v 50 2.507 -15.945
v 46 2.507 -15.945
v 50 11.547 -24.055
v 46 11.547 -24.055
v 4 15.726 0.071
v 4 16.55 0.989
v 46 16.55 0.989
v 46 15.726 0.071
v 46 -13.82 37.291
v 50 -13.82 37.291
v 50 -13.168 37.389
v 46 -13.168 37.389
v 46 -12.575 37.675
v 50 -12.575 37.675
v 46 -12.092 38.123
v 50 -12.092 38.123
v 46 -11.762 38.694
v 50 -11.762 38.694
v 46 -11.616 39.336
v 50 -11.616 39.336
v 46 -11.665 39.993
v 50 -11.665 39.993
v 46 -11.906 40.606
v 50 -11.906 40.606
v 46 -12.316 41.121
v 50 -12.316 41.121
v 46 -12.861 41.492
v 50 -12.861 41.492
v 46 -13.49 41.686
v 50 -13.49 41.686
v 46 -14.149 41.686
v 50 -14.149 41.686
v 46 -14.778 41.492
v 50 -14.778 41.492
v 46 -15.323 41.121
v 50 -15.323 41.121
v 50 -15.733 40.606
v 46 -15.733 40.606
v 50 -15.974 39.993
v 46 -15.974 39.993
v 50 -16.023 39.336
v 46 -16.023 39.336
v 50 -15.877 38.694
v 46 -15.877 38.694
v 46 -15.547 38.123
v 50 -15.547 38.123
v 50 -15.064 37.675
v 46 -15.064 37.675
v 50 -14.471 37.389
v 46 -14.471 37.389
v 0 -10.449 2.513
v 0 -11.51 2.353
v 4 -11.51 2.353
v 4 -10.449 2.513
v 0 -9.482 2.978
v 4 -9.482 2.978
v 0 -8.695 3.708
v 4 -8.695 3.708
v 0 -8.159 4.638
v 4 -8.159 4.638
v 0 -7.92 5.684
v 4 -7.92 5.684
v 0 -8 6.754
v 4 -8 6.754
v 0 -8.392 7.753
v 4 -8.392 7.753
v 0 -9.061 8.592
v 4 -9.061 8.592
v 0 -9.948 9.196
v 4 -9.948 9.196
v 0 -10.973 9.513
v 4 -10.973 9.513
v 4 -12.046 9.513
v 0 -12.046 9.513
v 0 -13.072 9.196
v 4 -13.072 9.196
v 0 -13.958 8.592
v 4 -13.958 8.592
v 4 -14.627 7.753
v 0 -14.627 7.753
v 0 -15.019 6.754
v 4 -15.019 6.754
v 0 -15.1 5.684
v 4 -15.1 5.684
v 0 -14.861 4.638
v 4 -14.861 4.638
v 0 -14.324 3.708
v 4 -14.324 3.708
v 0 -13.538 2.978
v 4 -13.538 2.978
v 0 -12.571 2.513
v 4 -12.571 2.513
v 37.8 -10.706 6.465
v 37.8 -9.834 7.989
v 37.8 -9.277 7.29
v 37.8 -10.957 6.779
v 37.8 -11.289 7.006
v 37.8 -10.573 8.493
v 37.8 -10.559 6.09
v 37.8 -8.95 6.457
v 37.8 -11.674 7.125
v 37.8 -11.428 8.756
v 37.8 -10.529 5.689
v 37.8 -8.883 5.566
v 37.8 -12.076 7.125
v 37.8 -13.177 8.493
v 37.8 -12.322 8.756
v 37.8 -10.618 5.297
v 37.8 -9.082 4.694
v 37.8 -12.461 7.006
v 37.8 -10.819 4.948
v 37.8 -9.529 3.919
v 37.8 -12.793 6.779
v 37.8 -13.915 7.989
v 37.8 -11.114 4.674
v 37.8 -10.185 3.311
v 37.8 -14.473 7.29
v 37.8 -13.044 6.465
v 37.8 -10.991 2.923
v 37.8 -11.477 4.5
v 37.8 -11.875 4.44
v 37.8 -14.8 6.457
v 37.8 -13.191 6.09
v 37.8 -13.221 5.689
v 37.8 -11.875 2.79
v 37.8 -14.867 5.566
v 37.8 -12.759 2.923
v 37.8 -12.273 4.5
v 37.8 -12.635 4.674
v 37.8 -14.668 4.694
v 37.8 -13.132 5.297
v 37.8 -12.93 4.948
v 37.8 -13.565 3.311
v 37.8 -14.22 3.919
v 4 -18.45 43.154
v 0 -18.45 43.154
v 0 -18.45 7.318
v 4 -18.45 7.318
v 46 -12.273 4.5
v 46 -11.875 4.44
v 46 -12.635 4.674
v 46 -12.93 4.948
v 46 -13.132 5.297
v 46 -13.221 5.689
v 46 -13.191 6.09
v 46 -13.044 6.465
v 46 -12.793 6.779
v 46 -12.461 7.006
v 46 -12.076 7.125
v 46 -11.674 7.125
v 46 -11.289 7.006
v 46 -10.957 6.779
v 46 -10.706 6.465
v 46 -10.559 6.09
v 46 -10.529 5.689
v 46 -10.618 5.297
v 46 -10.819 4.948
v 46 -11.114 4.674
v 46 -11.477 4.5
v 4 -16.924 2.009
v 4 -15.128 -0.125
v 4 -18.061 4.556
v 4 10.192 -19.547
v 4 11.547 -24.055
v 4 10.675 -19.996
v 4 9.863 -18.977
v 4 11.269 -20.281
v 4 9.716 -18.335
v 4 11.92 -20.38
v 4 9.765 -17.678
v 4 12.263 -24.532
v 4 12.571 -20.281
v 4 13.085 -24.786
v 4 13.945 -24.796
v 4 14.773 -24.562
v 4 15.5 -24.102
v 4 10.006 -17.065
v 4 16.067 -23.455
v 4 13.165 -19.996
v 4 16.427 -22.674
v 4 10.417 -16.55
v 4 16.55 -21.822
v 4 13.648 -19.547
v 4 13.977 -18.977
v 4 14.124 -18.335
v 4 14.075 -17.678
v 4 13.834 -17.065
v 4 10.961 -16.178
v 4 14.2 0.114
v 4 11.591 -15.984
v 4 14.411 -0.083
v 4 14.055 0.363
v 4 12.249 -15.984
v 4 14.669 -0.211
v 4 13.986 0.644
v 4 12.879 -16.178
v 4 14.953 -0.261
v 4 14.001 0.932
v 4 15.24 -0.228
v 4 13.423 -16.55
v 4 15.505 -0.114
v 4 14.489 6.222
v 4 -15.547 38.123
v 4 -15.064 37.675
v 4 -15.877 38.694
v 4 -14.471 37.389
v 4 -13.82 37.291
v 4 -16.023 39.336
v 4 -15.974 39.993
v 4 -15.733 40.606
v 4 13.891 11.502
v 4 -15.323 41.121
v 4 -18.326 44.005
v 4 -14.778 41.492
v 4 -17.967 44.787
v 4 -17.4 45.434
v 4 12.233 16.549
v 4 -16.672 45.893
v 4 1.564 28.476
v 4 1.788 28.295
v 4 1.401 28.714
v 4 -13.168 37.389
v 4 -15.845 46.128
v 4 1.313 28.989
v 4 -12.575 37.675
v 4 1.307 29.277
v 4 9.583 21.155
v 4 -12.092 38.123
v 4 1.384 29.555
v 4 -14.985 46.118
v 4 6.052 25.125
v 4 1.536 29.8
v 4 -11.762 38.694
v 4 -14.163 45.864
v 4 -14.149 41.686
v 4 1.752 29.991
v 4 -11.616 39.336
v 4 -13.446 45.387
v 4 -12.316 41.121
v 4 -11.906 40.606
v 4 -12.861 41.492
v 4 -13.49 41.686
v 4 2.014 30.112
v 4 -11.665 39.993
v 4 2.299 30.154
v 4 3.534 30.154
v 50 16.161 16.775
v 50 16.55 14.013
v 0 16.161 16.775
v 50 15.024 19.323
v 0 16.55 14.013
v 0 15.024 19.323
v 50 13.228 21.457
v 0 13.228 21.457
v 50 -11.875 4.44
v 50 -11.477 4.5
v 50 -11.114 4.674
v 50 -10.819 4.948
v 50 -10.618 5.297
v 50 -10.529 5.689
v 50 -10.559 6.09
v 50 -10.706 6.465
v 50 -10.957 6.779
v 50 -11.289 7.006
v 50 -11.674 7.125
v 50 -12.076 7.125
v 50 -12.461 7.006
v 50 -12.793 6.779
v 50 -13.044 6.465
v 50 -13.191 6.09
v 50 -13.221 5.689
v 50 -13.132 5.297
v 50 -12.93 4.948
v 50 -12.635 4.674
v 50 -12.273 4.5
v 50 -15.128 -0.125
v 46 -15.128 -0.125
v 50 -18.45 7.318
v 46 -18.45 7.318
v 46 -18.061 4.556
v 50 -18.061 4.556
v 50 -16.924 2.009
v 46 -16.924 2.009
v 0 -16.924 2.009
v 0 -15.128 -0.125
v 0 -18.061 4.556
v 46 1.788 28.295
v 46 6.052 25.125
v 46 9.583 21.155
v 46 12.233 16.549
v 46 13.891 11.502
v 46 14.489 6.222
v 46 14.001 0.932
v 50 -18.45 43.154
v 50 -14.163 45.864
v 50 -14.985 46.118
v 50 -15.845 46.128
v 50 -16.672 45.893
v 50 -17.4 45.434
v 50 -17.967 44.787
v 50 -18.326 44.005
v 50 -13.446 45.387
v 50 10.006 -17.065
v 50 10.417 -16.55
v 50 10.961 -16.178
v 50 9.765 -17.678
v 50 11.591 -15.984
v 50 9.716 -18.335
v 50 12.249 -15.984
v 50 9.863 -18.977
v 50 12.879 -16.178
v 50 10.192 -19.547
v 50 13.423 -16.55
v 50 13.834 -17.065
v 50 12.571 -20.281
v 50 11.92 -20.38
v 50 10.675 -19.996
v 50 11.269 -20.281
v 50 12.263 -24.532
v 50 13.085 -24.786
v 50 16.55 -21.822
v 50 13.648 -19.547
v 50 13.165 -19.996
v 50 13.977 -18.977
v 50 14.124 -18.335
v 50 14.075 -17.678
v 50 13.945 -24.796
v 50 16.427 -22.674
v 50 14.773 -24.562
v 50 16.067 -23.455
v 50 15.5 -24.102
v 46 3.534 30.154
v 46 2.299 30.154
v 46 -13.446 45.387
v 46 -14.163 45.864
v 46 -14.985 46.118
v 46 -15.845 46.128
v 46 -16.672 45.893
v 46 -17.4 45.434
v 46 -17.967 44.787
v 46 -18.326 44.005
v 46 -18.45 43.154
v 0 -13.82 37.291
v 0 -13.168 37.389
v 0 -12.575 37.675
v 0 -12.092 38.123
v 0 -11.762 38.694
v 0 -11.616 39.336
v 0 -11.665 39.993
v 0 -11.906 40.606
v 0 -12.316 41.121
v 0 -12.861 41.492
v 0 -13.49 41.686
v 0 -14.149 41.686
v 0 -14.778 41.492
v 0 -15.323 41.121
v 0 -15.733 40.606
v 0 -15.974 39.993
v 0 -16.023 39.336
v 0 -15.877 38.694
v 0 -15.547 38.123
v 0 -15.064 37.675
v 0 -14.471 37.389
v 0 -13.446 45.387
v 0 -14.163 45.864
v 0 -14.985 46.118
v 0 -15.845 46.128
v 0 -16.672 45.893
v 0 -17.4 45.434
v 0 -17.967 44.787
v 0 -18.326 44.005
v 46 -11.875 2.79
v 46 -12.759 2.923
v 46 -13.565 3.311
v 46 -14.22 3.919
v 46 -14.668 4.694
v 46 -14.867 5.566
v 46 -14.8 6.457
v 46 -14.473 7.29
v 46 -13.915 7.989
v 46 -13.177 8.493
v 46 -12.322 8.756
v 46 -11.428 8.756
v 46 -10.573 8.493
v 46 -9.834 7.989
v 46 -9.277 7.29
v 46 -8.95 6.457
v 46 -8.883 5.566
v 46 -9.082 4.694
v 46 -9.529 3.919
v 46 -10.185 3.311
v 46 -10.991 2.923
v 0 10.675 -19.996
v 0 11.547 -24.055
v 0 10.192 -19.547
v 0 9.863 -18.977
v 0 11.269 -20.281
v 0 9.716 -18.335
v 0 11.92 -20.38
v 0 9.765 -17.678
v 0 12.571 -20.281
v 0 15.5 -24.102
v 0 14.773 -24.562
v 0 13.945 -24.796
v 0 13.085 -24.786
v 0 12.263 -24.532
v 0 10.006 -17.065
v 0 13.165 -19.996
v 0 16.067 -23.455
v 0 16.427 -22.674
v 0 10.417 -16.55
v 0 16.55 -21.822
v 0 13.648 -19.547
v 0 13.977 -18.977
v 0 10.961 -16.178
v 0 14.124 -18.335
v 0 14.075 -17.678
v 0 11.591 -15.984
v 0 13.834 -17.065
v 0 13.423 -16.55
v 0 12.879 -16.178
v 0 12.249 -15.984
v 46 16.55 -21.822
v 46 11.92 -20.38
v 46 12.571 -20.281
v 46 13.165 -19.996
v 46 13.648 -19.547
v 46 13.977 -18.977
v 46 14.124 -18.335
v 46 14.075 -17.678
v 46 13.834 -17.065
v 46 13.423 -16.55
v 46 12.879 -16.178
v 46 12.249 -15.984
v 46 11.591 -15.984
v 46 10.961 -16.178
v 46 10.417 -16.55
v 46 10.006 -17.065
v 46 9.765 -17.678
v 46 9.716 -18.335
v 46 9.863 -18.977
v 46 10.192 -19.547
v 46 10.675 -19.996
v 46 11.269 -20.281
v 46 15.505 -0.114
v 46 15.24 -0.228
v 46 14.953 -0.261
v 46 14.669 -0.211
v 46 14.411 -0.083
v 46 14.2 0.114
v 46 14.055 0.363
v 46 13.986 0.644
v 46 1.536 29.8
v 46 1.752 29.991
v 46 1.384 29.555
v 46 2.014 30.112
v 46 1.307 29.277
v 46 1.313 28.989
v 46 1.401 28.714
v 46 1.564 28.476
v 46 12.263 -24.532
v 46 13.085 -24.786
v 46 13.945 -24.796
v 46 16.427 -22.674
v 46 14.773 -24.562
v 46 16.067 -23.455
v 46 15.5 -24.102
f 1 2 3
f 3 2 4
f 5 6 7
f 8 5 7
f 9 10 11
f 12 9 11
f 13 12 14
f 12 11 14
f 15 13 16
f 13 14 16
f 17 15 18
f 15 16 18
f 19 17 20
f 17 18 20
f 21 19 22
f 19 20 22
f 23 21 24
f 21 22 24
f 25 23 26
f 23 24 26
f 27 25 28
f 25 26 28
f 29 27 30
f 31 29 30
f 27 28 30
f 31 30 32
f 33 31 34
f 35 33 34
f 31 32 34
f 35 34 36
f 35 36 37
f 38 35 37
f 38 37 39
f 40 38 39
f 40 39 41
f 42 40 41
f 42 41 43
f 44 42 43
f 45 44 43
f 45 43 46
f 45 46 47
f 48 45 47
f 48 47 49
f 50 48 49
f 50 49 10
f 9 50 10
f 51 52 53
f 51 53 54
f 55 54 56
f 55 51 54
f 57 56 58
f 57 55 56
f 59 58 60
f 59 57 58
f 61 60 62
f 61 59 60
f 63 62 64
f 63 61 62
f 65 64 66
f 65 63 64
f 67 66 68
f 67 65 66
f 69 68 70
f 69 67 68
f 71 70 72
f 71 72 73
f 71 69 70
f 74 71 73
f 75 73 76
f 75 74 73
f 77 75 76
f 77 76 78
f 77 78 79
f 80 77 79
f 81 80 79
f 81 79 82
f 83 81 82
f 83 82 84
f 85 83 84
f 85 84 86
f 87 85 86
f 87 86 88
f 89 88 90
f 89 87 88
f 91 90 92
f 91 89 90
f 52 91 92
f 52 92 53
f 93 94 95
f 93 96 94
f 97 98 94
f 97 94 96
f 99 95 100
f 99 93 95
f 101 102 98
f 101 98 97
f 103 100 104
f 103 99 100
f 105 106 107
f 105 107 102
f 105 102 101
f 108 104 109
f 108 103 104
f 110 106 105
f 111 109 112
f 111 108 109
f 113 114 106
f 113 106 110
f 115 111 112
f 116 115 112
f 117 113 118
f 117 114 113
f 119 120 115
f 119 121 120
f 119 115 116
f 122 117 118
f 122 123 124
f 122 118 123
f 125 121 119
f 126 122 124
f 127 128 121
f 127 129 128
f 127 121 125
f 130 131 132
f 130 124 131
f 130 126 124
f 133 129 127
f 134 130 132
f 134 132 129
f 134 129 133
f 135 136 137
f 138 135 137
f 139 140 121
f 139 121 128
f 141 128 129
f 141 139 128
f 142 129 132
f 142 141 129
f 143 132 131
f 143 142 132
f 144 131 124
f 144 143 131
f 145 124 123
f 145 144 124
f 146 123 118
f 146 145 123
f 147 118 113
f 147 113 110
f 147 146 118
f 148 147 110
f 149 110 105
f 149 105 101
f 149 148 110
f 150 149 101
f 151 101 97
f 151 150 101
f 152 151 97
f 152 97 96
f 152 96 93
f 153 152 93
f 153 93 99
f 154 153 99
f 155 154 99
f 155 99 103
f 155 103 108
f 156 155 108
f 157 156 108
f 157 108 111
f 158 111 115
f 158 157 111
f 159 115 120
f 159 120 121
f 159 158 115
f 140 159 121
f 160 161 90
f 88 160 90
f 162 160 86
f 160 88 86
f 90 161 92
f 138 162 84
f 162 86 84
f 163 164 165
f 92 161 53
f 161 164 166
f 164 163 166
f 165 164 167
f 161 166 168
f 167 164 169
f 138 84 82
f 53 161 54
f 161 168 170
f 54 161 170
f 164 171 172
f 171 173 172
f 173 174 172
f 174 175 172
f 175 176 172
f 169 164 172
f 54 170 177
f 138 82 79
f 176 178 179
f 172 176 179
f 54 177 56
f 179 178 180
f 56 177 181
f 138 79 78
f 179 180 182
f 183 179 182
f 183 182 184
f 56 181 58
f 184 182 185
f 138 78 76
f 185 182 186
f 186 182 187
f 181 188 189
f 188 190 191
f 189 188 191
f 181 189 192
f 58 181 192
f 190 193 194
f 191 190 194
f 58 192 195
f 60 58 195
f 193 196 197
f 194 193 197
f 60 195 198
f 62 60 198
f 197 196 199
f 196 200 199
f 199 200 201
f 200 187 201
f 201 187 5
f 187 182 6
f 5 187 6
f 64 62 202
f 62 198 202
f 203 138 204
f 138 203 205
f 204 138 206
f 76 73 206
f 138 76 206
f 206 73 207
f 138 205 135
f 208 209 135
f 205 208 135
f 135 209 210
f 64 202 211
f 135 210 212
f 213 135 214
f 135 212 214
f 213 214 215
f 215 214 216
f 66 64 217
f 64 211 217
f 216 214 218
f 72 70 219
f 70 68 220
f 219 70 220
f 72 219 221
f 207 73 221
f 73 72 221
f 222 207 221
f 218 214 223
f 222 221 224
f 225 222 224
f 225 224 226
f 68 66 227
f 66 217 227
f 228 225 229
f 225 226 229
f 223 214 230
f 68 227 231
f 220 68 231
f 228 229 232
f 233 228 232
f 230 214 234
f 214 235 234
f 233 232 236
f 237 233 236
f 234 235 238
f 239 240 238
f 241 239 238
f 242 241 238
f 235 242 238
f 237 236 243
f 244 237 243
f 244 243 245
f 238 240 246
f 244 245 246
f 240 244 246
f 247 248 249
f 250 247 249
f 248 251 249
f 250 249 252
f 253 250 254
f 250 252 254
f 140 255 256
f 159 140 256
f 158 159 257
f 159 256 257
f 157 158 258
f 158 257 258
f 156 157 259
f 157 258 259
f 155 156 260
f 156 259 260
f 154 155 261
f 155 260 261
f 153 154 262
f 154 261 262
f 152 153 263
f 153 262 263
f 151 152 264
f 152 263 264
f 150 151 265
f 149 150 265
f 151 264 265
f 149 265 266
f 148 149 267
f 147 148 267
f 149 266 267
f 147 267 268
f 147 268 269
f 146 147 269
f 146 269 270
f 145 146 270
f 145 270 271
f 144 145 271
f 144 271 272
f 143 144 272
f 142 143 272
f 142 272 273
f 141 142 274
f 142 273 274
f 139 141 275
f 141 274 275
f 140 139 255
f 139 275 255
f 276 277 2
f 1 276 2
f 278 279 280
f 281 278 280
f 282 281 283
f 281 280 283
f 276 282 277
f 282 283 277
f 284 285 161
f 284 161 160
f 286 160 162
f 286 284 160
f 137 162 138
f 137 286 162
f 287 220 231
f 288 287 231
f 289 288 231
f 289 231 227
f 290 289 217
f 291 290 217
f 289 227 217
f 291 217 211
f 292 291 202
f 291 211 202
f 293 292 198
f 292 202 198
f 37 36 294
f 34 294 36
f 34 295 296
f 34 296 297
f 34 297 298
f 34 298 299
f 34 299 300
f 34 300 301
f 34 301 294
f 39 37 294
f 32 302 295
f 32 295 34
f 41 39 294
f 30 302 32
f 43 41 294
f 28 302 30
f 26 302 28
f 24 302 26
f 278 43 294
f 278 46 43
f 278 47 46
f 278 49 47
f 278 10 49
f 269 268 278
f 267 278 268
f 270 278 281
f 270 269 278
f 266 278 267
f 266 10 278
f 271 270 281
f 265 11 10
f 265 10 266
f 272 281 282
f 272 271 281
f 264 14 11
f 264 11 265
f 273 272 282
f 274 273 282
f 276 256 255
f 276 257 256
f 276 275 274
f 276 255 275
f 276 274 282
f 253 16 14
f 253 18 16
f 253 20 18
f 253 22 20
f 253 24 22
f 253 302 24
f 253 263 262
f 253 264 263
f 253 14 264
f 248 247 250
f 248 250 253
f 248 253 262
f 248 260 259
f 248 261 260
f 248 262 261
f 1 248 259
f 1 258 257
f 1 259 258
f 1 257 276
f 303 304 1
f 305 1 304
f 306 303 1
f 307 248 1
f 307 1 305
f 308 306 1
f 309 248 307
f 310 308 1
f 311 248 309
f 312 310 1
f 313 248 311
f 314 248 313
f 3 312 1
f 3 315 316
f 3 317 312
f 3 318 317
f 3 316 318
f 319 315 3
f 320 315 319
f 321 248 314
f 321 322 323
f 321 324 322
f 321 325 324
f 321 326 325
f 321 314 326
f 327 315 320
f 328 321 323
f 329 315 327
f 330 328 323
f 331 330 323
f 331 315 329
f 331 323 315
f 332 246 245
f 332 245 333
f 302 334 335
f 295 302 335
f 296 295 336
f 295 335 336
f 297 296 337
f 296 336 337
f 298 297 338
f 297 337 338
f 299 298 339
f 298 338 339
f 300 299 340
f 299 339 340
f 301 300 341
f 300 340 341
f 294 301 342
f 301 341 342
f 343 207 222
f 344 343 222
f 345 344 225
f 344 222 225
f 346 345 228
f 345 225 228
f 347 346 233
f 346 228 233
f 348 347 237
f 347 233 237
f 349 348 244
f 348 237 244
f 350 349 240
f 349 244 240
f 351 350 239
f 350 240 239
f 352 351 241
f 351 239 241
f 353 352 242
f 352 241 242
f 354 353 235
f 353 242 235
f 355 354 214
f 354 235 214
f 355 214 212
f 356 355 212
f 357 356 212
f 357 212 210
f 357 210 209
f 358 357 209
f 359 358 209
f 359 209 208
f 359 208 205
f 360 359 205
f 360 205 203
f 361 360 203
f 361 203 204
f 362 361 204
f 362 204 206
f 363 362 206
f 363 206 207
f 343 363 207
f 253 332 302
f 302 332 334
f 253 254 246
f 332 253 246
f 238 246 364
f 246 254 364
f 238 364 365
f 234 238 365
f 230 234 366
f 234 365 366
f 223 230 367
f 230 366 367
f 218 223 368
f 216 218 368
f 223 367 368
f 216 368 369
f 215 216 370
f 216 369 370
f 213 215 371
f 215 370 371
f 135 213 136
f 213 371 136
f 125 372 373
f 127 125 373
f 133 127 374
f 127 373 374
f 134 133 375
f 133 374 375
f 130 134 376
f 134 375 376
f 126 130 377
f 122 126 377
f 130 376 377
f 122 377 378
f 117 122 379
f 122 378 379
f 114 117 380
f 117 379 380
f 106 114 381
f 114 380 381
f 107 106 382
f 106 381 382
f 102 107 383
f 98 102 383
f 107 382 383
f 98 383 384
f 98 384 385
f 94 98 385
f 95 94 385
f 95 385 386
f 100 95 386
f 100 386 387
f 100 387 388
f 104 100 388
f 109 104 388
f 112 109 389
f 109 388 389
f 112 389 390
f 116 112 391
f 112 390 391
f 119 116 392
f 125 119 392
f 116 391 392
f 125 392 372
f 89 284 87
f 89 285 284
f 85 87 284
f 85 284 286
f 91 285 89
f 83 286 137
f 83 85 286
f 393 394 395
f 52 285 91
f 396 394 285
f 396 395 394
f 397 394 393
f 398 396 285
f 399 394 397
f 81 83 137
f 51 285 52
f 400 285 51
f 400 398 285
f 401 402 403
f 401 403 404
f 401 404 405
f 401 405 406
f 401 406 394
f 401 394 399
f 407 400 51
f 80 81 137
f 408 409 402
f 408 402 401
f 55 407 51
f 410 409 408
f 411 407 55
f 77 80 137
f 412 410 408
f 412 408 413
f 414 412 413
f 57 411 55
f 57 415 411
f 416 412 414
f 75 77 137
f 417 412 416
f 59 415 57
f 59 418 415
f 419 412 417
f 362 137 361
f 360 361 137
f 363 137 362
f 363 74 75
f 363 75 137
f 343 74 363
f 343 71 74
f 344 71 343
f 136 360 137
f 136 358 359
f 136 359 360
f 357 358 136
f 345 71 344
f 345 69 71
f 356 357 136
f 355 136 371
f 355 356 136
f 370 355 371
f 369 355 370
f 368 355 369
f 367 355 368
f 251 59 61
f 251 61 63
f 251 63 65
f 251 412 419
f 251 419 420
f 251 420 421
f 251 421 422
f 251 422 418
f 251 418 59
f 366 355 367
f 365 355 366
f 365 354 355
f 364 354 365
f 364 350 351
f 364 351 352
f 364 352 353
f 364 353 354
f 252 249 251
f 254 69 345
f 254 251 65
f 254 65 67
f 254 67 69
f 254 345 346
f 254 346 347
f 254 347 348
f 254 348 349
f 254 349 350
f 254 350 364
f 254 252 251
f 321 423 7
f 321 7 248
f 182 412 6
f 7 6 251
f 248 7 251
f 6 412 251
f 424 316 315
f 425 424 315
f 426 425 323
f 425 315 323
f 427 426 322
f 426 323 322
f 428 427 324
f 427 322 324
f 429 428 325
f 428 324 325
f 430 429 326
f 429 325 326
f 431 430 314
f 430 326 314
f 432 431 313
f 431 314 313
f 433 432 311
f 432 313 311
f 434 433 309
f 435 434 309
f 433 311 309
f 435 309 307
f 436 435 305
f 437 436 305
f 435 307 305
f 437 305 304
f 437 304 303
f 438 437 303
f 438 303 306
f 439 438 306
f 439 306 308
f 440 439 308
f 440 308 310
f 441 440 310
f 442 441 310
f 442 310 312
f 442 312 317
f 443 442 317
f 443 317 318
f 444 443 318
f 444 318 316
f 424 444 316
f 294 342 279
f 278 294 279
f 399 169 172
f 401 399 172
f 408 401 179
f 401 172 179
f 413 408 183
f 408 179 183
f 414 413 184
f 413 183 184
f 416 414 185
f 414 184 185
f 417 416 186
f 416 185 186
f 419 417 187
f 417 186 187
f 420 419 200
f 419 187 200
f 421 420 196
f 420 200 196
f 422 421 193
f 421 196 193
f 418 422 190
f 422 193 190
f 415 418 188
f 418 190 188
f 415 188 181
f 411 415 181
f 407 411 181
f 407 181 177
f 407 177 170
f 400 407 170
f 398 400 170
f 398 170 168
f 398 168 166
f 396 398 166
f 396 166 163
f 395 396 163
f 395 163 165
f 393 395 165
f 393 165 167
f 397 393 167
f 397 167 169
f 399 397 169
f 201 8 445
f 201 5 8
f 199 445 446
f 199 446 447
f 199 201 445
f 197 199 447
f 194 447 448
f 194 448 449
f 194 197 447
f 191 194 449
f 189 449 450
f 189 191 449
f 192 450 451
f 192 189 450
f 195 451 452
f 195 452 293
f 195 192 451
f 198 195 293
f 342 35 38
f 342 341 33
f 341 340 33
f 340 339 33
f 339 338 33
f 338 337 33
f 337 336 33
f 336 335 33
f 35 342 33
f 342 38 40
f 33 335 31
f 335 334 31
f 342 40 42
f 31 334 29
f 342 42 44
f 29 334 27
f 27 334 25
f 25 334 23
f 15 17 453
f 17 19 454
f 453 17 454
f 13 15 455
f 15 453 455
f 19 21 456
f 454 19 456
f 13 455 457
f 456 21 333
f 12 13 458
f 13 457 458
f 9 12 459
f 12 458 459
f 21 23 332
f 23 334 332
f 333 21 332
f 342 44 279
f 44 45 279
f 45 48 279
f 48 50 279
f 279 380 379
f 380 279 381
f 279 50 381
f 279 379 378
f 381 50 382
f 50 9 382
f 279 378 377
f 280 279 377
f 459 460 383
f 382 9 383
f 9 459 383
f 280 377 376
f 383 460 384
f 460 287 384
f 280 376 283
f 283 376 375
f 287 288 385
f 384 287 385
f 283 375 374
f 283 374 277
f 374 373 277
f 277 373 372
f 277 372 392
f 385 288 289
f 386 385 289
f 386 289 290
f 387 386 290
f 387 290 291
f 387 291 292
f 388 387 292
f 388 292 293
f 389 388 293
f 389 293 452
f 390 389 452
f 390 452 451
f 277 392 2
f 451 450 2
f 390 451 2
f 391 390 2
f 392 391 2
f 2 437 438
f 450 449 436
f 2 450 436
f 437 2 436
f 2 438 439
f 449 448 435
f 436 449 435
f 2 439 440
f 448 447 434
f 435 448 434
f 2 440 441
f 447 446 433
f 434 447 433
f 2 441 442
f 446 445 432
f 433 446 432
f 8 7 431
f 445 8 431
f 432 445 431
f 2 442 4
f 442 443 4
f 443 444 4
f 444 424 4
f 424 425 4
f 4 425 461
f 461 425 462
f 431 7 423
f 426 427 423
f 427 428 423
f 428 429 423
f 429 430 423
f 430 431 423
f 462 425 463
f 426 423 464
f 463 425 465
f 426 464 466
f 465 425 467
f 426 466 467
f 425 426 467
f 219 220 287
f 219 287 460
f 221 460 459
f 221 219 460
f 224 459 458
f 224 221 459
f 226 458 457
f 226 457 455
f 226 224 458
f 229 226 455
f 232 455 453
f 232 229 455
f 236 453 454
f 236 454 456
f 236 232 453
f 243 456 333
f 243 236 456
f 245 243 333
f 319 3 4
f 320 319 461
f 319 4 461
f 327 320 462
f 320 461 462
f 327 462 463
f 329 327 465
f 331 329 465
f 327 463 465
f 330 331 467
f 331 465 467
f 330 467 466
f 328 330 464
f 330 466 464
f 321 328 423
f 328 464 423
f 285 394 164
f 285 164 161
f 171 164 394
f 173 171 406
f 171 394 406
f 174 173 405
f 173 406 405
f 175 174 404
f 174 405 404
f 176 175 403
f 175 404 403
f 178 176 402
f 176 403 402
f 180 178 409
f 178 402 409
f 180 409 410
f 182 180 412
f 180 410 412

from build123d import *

# Parameters (mm, degrees)
SKETCH4_R            = 3.6
THICKBASE_DEPTH      = 4
MIDDLE_DEPTH         = 42
THINBASE_DEPTH       = 4
SKETCH8_R            = 1.35
RETAINERSCREW_DEPTH  = 4
SKETCH9_R            = 3
SKETCH9_R_2          = 1.35
SPACER_DEPTH         = 8.2
SKETCH15_W           = 42
SKETCH15_H           = 16
CUT_EXTRUDE_H1_DEPTH = 77.519145025
SKETCH17_W           = 42
SKETCH17_H           = 16
CUT_EXTRUDE_H2_DEPTH = 75.830901411
FILLET_R1_R          = 1
FILLET_R2_R          = 1
SKETCH18_R           = 2.21
SIDESCREWS_DEPTH     = 71.502298398


with BuildPart() as part:
    # Sketch4 → ThickBase (new body)
    with BuildSketch(Plane(origin=(0, 0, 0), x_dir=(0, 0, -1), z_dir=(1, 0, 0))):
        with BuildLine():
            Line((-14.01318338, 16.550216151), (21.822267157, 16.550216151))
            ThreePointArc((21.822267157, 16.550216151), (24.561793845, 14.77291543), (24.055345362, 11.546878503))
            Line((24.055345362, 11.546878503), (0.125176293, -15.12757601))
            ThreePointArc((0.125176293, -15.12757601), (-3.242753458, -17.581539475), (-7.318417722, -18.449783849))
            Line((-7.318417722, -18.449783849), (-43.153868259, -18.449783849))
            ThreePointArc((-43.153868259, -18.449783849), (-45.893394947, -16.672483128), (-45.386946464, -13.446446201))
            Line((-45.386946464, -13.446446201), (-21.456777395, 13.228008312))
            ThreePointArc((-21.456777395, 13.228008312), (-18.088847644, 15.681971777), (-14.01318338, 16.550216151))
        make_face()
        with Locations((-5.952745457, -11.509649573)):
            Circle(SKETCH4_R, mode=Mode.SUBTRACT)
    extrude(amount=THICKBASE_DEPTH)

    # Sketch5 → Middle (add)
    with BuildSketch(Plane(origin=(4, 0, 0), x_dir=(0, 0, -1), z_dir=(1, 0, 0))):
        with BuildLine():
            Line((15.945305194, 2.506787856), (24.055345362, 11.546878503))
            ThreePointArc((24.055345362, 11.546878503), (24.561793845, 14.77291543), (21.822267157, 16.550216151))
            Line((21.822267157, 16.550216151), (-14.01318338, 16.550216151))
            ThreePointArc((-14.01318338, 16.550216151), (-18.088847644, 15.681971777), (-21.456777395, 13.228008312))
            Line((-21.456777395, 13.228008312), (-45.386946464, -13.446446201))
            ThreePointArc((-45.386946464, -13.446446201), (-45.893394947, -16.672483128), (-43.153868259, -18.449783849))
            Line((-43.153868259, -18.449783849), (-31.009075531, -18.449783849))
            ThreePointArc((-31.009075531, -18.449783849), (-16.549356077, 12.232654103), (15.945305194, 2.506787856))
        make_face()
    extrude(amount=MIDDLE_DEPTH)

    # Sketch7 → ThinBase (add)
    with BuildSketch(Plane(origin=(46, 0, 0), x_dir=(0, 0, -1), z_dir=(1, 0, 0))):
        with BuildLine():
            ThreePointArc((15.945305194, 2.506787856), (-16.549356077, 12.232654103), (-31.009075531, -18.449783849))
            Line((-31.009075531, -18.449783849), (-7.318417722, -18.449783849))
            ThreePointArc((-7.318417722, -18.449783849), (-3.242753458, -17.581539475), (0.125176293, -15.12757601))
            Line((0.125176293, -15.12757601), (15.945305194, 2.506787856))
        make_face()
        with BuildLine():
            Line((-43.153868259, -18.449783849), (-31.009075531, -18.449783849))
            ThreePointArc((-31.009075531, -18.449783849), (-16.549356077, 12.232654103), (15.945305194, 2.506787856))
            Line((15.945305194, 2.506787856), (24.055345362, 11.546878503))
            ThreePointArc((24.055345362, 11.546878503), (24.561793845, 14.77291543), (21.822267157, 16.550216151))
            Line((21.822267157, 16.550216151), (-14.01318338, 16.550216151))
            ThreePointArc((-14.01318338, 16.550216151), (-18.088847644, 15.681971777), (-21.456777395, 13.228008312))
            Line((-21.456777395, 13.228008312), (-45.386946464, -13.446446201))
            ThreePointArc((-45.386946464, -13.446446201), (-45.893394947, -16.672483128), (-43.153868259, -18.449783849))
        make_face()
    extrude(amount=THINBASE_DEPTH)

    # Sketch8 → RetainerScrew (cut)
    with BuildSketch(Plane(origin=(50, 0, 0), x_dir=(0, 0, -1), z_dir=(1, 0, 0))):
        with Locations((-5.789718886, -11.874919798)):
            Circle(SKETCH8_R)
    extrude(amount=-RETAINERSCREW_DEPTH, mode=Mode.SUBTRACT)

    # Sketch9 → Spacer (add)
    with BuildSketch(Plane.ZY.offset(-46)):
        with Locations(Location((5.789718886, -11.874919798, 0), (0, 0, 180))):
            Circle(SKETCH9_R)
        with Locations(Location((5.789718886, -11.874919798, 0), (0, 0, 180))):
            Circle(SKETCH9_R_2, mode=Mode.SUBTRACT)
    extrude(amount=SPACER_DEPTH)

    # Sketch15 → Cut-Extrude H1 (cut, through all)
    with BuildSketch(Plane(origin=(0, 16.550216151, 0), x_dir=(1, 0, 0), z_dir=(0, 1, 0))):
        with Locations((25, -38.153868259)):
            Rectangle(SKETCH15_W, SKETCH15_H)
    extrude(amount=-CUT_EXTRUDE_H1_DEPTH, mode=Mode.SUBTRACT)

    # Sketch17 → Cut-Extrude H2 (cut, through all)
    with BuildSketch(Plane(origin=(0, 16.564225392, 18.463792524), x_dir=(1, 0, 0), z_dir=(0, 0.6677792161146302, 0.7443594014488768))):
        with Locations((25, 19.65868724)):
            Rectangle(SKETCH17_W, SKETCH17_H)
    extrude(amount=-CUT_EXTRUDE_H2_DEPTH, mode=Mode.SUBTRACT)

    # Fillet R1
    fillet_r1_edges = [part.edges().sort_by_distance(p)[0] for p in [
        (25, -2.007502678, 30.153868259),
    ]]
    fillet(fillet_r1_edges, radius=FILLET_R1_R)

    # Fillet R2
    fillet_r2_edges = [part.edges().sort_by_distance(p)[0] for p in [
        (25, 12.850019915, -3.135248981),
    ]]
    fillet(fillet_r2_edges, radius=FILLET_R2_R)

    # Sketch18 → SideScrews (cut, through all)
    with BuildSketch(Plane(origin=(50, 0, 0), x_dir=(0, 0, -1), z_dir=(1, 0, 0))):
        with Locations((-39.501166009, -13.819518143)):
            Circle(SKETCH18_R)
        with Locations((18.169564907, 11.919950445)):
            Circle(SKETCH18_R)
    extrude(amount=-SIDESCREWS_DEPTH, mode=Mode.SUBTRACT)


solid = part.part
